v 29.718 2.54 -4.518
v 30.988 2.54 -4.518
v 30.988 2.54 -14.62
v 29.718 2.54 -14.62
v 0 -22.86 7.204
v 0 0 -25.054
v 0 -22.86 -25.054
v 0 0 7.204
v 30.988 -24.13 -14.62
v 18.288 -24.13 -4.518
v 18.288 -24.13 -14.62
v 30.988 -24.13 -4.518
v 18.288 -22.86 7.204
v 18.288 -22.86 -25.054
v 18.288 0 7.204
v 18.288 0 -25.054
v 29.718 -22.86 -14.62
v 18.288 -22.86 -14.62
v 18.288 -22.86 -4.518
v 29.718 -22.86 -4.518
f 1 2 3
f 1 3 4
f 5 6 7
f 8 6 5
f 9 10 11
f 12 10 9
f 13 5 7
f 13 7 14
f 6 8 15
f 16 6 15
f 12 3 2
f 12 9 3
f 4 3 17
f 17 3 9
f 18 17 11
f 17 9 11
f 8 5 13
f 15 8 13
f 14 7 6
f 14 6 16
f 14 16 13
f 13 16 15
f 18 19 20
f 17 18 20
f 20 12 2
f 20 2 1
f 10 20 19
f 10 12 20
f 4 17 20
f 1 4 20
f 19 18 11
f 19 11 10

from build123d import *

# Parameters (mm, degrees)
F0_W     = 18.288
F0_H     = 32.258
F1_DEPTH = 22.86
F2_W     = 12.7
F2_H     = 10.102273
F3_DEPTH = 1.27
F4_W     = 1.27
F4_H     = 10.102273
F5_DEPTH = 25.4


with BuildPart() as f1:
    # F0 (on Front) → F1 (new body)
    with BuildSketch(Plane.XZ):
        with Locations((9.144, -8.924786)):
            Rectangle(F0_W, F0_H)
    extrude(amount=F1_DEPTH)


with BuildPart() as f3:
    # F2 (on face) → F3 (new body)
    with BuildSketch(Plane.XZ.offset(22.86)):
        with Locations((24.638, -9.569005)):
            Rectangle(F2_W, F2_H)
    extrude(amount=F3_DEPTH)

    # F4 (on face) → F5 (join)
    with BuildSketch(Plane(origin=(0, -22.86, 0), x_dir=(-1, 0, 0), z_dir=(0, 1, 0))):
        with Locations((-30.353, -9.569005)):
            Rectangle(F4_W, F4_H)
    extrude(amount=F5_DEPTH)


solid = Compound([f1.part, f3.part])
